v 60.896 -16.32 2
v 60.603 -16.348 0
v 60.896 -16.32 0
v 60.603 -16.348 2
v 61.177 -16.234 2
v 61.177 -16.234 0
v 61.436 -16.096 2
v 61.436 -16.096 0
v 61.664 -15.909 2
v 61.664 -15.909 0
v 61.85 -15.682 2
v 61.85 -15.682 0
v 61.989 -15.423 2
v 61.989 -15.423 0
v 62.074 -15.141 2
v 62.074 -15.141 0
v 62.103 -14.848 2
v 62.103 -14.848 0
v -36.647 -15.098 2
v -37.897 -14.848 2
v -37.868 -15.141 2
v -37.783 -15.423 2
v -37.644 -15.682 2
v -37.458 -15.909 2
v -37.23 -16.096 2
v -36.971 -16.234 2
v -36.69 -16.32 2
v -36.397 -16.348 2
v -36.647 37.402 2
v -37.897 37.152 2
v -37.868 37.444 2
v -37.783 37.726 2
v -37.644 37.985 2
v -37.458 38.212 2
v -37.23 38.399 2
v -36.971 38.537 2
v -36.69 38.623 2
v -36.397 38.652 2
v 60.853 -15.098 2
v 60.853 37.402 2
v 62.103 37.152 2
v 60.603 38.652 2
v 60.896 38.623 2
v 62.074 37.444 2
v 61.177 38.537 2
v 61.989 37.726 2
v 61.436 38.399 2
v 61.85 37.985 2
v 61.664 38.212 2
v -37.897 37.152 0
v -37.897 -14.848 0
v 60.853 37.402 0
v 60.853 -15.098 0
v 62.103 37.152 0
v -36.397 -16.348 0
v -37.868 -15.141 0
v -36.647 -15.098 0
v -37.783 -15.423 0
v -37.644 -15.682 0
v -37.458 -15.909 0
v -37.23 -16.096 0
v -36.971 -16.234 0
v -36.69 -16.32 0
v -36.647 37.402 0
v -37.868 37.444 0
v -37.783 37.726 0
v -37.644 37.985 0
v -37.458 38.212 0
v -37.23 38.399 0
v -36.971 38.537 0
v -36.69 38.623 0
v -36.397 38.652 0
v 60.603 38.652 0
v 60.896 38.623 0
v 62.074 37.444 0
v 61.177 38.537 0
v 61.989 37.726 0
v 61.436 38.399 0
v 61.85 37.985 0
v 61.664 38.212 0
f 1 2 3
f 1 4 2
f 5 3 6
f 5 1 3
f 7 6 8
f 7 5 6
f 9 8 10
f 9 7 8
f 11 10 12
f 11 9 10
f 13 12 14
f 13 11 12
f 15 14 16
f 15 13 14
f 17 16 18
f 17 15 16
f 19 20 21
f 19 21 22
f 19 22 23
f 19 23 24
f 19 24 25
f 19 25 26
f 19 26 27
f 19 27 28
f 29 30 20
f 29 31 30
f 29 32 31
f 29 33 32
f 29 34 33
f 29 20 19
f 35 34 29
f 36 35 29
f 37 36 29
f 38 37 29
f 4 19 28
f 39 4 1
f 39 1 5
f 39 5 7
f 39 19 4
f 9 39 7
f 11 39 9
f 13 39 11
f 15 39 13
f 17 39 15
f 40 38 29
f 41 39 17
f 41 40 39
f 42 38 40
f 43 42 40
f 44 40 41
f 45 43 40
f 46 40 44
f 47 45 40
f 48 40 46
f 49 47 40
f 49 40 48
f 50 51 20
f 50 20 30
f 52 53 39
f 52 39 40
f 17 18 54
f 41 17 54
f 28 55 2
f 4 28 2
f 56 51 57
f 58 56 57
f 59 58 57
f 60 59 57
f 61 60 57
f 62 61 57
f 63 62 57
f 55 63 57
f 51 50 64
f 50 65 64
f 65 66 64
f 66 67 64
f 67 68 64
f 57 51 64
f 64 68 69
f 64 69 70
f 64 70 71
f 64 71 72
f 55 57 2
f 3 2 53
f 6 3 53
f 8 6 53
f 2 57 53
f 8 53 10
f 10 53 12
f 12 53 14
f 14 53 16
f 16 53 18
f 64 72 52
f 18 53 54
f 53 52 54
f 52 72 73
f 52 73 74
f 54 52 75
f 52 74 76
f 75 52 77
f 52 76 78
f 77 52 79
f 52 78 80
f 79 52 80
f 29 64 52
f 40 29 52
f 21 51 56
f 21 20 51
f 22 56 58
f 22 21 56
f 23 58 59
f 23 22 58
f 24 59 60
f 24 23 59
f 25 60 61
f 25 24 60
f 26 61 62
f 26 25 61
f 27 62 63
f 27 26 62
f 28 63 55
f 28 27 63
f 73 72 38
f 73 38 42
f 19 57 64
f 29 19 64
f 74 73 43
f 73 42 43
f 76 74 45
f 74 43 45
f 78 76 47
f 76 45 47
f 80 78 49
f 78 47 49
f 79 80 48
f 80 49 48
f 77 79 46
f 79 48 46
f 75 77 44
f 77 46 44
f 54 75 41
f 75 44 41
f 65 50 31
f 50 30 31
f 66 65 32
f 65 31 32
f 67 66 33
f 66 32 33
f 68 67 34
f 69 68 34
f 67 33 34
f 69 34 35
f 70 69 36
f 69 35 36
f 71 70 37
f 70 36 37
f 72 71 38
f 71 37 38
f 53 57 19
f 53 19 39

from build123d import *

# Parameters (mm, degrees)
SKETCH1_W           = 100
SKETCH1_H           = 55
SKETCH1_W_2         = 97.5
SKETCH1_H_2         = 52.5
BOSS_EXTRUDE1_DEPTH = 2
FILLET1_R           = 1.5


with BuildPart() as part:
    # Sketch1 → Boss-Extrude1 (new body)
    with BuildSketch(Plane.XY):
        with Locations((12.10302883, 11.151503687)):
            Rectangle(SKETCH1_W, SKETCH1_H)
        with Locations((12.10302883, 11.151503687)):
            Rectangle(SKETCH1_W_2, SKETCH1_H_2, mode=Mode.SUBTRACT)
    extrude(amount=BOSS_EXTRUDE1_DEPTH)

    # Fillet1
    fillet1_edges = [part.edges().sort_by_distance(p)[0] for p in [
        (-37.89697117, 38.651503687, 1),
        (62.10302883, 38.651503687, 1),
        (62.10302883, -16.348496313, 1),
        (-37.89697117, -16.348496313, 1),
    ]]
    fillet(fillet1_edges, radius=FILLET1_R)


solid = part.part
